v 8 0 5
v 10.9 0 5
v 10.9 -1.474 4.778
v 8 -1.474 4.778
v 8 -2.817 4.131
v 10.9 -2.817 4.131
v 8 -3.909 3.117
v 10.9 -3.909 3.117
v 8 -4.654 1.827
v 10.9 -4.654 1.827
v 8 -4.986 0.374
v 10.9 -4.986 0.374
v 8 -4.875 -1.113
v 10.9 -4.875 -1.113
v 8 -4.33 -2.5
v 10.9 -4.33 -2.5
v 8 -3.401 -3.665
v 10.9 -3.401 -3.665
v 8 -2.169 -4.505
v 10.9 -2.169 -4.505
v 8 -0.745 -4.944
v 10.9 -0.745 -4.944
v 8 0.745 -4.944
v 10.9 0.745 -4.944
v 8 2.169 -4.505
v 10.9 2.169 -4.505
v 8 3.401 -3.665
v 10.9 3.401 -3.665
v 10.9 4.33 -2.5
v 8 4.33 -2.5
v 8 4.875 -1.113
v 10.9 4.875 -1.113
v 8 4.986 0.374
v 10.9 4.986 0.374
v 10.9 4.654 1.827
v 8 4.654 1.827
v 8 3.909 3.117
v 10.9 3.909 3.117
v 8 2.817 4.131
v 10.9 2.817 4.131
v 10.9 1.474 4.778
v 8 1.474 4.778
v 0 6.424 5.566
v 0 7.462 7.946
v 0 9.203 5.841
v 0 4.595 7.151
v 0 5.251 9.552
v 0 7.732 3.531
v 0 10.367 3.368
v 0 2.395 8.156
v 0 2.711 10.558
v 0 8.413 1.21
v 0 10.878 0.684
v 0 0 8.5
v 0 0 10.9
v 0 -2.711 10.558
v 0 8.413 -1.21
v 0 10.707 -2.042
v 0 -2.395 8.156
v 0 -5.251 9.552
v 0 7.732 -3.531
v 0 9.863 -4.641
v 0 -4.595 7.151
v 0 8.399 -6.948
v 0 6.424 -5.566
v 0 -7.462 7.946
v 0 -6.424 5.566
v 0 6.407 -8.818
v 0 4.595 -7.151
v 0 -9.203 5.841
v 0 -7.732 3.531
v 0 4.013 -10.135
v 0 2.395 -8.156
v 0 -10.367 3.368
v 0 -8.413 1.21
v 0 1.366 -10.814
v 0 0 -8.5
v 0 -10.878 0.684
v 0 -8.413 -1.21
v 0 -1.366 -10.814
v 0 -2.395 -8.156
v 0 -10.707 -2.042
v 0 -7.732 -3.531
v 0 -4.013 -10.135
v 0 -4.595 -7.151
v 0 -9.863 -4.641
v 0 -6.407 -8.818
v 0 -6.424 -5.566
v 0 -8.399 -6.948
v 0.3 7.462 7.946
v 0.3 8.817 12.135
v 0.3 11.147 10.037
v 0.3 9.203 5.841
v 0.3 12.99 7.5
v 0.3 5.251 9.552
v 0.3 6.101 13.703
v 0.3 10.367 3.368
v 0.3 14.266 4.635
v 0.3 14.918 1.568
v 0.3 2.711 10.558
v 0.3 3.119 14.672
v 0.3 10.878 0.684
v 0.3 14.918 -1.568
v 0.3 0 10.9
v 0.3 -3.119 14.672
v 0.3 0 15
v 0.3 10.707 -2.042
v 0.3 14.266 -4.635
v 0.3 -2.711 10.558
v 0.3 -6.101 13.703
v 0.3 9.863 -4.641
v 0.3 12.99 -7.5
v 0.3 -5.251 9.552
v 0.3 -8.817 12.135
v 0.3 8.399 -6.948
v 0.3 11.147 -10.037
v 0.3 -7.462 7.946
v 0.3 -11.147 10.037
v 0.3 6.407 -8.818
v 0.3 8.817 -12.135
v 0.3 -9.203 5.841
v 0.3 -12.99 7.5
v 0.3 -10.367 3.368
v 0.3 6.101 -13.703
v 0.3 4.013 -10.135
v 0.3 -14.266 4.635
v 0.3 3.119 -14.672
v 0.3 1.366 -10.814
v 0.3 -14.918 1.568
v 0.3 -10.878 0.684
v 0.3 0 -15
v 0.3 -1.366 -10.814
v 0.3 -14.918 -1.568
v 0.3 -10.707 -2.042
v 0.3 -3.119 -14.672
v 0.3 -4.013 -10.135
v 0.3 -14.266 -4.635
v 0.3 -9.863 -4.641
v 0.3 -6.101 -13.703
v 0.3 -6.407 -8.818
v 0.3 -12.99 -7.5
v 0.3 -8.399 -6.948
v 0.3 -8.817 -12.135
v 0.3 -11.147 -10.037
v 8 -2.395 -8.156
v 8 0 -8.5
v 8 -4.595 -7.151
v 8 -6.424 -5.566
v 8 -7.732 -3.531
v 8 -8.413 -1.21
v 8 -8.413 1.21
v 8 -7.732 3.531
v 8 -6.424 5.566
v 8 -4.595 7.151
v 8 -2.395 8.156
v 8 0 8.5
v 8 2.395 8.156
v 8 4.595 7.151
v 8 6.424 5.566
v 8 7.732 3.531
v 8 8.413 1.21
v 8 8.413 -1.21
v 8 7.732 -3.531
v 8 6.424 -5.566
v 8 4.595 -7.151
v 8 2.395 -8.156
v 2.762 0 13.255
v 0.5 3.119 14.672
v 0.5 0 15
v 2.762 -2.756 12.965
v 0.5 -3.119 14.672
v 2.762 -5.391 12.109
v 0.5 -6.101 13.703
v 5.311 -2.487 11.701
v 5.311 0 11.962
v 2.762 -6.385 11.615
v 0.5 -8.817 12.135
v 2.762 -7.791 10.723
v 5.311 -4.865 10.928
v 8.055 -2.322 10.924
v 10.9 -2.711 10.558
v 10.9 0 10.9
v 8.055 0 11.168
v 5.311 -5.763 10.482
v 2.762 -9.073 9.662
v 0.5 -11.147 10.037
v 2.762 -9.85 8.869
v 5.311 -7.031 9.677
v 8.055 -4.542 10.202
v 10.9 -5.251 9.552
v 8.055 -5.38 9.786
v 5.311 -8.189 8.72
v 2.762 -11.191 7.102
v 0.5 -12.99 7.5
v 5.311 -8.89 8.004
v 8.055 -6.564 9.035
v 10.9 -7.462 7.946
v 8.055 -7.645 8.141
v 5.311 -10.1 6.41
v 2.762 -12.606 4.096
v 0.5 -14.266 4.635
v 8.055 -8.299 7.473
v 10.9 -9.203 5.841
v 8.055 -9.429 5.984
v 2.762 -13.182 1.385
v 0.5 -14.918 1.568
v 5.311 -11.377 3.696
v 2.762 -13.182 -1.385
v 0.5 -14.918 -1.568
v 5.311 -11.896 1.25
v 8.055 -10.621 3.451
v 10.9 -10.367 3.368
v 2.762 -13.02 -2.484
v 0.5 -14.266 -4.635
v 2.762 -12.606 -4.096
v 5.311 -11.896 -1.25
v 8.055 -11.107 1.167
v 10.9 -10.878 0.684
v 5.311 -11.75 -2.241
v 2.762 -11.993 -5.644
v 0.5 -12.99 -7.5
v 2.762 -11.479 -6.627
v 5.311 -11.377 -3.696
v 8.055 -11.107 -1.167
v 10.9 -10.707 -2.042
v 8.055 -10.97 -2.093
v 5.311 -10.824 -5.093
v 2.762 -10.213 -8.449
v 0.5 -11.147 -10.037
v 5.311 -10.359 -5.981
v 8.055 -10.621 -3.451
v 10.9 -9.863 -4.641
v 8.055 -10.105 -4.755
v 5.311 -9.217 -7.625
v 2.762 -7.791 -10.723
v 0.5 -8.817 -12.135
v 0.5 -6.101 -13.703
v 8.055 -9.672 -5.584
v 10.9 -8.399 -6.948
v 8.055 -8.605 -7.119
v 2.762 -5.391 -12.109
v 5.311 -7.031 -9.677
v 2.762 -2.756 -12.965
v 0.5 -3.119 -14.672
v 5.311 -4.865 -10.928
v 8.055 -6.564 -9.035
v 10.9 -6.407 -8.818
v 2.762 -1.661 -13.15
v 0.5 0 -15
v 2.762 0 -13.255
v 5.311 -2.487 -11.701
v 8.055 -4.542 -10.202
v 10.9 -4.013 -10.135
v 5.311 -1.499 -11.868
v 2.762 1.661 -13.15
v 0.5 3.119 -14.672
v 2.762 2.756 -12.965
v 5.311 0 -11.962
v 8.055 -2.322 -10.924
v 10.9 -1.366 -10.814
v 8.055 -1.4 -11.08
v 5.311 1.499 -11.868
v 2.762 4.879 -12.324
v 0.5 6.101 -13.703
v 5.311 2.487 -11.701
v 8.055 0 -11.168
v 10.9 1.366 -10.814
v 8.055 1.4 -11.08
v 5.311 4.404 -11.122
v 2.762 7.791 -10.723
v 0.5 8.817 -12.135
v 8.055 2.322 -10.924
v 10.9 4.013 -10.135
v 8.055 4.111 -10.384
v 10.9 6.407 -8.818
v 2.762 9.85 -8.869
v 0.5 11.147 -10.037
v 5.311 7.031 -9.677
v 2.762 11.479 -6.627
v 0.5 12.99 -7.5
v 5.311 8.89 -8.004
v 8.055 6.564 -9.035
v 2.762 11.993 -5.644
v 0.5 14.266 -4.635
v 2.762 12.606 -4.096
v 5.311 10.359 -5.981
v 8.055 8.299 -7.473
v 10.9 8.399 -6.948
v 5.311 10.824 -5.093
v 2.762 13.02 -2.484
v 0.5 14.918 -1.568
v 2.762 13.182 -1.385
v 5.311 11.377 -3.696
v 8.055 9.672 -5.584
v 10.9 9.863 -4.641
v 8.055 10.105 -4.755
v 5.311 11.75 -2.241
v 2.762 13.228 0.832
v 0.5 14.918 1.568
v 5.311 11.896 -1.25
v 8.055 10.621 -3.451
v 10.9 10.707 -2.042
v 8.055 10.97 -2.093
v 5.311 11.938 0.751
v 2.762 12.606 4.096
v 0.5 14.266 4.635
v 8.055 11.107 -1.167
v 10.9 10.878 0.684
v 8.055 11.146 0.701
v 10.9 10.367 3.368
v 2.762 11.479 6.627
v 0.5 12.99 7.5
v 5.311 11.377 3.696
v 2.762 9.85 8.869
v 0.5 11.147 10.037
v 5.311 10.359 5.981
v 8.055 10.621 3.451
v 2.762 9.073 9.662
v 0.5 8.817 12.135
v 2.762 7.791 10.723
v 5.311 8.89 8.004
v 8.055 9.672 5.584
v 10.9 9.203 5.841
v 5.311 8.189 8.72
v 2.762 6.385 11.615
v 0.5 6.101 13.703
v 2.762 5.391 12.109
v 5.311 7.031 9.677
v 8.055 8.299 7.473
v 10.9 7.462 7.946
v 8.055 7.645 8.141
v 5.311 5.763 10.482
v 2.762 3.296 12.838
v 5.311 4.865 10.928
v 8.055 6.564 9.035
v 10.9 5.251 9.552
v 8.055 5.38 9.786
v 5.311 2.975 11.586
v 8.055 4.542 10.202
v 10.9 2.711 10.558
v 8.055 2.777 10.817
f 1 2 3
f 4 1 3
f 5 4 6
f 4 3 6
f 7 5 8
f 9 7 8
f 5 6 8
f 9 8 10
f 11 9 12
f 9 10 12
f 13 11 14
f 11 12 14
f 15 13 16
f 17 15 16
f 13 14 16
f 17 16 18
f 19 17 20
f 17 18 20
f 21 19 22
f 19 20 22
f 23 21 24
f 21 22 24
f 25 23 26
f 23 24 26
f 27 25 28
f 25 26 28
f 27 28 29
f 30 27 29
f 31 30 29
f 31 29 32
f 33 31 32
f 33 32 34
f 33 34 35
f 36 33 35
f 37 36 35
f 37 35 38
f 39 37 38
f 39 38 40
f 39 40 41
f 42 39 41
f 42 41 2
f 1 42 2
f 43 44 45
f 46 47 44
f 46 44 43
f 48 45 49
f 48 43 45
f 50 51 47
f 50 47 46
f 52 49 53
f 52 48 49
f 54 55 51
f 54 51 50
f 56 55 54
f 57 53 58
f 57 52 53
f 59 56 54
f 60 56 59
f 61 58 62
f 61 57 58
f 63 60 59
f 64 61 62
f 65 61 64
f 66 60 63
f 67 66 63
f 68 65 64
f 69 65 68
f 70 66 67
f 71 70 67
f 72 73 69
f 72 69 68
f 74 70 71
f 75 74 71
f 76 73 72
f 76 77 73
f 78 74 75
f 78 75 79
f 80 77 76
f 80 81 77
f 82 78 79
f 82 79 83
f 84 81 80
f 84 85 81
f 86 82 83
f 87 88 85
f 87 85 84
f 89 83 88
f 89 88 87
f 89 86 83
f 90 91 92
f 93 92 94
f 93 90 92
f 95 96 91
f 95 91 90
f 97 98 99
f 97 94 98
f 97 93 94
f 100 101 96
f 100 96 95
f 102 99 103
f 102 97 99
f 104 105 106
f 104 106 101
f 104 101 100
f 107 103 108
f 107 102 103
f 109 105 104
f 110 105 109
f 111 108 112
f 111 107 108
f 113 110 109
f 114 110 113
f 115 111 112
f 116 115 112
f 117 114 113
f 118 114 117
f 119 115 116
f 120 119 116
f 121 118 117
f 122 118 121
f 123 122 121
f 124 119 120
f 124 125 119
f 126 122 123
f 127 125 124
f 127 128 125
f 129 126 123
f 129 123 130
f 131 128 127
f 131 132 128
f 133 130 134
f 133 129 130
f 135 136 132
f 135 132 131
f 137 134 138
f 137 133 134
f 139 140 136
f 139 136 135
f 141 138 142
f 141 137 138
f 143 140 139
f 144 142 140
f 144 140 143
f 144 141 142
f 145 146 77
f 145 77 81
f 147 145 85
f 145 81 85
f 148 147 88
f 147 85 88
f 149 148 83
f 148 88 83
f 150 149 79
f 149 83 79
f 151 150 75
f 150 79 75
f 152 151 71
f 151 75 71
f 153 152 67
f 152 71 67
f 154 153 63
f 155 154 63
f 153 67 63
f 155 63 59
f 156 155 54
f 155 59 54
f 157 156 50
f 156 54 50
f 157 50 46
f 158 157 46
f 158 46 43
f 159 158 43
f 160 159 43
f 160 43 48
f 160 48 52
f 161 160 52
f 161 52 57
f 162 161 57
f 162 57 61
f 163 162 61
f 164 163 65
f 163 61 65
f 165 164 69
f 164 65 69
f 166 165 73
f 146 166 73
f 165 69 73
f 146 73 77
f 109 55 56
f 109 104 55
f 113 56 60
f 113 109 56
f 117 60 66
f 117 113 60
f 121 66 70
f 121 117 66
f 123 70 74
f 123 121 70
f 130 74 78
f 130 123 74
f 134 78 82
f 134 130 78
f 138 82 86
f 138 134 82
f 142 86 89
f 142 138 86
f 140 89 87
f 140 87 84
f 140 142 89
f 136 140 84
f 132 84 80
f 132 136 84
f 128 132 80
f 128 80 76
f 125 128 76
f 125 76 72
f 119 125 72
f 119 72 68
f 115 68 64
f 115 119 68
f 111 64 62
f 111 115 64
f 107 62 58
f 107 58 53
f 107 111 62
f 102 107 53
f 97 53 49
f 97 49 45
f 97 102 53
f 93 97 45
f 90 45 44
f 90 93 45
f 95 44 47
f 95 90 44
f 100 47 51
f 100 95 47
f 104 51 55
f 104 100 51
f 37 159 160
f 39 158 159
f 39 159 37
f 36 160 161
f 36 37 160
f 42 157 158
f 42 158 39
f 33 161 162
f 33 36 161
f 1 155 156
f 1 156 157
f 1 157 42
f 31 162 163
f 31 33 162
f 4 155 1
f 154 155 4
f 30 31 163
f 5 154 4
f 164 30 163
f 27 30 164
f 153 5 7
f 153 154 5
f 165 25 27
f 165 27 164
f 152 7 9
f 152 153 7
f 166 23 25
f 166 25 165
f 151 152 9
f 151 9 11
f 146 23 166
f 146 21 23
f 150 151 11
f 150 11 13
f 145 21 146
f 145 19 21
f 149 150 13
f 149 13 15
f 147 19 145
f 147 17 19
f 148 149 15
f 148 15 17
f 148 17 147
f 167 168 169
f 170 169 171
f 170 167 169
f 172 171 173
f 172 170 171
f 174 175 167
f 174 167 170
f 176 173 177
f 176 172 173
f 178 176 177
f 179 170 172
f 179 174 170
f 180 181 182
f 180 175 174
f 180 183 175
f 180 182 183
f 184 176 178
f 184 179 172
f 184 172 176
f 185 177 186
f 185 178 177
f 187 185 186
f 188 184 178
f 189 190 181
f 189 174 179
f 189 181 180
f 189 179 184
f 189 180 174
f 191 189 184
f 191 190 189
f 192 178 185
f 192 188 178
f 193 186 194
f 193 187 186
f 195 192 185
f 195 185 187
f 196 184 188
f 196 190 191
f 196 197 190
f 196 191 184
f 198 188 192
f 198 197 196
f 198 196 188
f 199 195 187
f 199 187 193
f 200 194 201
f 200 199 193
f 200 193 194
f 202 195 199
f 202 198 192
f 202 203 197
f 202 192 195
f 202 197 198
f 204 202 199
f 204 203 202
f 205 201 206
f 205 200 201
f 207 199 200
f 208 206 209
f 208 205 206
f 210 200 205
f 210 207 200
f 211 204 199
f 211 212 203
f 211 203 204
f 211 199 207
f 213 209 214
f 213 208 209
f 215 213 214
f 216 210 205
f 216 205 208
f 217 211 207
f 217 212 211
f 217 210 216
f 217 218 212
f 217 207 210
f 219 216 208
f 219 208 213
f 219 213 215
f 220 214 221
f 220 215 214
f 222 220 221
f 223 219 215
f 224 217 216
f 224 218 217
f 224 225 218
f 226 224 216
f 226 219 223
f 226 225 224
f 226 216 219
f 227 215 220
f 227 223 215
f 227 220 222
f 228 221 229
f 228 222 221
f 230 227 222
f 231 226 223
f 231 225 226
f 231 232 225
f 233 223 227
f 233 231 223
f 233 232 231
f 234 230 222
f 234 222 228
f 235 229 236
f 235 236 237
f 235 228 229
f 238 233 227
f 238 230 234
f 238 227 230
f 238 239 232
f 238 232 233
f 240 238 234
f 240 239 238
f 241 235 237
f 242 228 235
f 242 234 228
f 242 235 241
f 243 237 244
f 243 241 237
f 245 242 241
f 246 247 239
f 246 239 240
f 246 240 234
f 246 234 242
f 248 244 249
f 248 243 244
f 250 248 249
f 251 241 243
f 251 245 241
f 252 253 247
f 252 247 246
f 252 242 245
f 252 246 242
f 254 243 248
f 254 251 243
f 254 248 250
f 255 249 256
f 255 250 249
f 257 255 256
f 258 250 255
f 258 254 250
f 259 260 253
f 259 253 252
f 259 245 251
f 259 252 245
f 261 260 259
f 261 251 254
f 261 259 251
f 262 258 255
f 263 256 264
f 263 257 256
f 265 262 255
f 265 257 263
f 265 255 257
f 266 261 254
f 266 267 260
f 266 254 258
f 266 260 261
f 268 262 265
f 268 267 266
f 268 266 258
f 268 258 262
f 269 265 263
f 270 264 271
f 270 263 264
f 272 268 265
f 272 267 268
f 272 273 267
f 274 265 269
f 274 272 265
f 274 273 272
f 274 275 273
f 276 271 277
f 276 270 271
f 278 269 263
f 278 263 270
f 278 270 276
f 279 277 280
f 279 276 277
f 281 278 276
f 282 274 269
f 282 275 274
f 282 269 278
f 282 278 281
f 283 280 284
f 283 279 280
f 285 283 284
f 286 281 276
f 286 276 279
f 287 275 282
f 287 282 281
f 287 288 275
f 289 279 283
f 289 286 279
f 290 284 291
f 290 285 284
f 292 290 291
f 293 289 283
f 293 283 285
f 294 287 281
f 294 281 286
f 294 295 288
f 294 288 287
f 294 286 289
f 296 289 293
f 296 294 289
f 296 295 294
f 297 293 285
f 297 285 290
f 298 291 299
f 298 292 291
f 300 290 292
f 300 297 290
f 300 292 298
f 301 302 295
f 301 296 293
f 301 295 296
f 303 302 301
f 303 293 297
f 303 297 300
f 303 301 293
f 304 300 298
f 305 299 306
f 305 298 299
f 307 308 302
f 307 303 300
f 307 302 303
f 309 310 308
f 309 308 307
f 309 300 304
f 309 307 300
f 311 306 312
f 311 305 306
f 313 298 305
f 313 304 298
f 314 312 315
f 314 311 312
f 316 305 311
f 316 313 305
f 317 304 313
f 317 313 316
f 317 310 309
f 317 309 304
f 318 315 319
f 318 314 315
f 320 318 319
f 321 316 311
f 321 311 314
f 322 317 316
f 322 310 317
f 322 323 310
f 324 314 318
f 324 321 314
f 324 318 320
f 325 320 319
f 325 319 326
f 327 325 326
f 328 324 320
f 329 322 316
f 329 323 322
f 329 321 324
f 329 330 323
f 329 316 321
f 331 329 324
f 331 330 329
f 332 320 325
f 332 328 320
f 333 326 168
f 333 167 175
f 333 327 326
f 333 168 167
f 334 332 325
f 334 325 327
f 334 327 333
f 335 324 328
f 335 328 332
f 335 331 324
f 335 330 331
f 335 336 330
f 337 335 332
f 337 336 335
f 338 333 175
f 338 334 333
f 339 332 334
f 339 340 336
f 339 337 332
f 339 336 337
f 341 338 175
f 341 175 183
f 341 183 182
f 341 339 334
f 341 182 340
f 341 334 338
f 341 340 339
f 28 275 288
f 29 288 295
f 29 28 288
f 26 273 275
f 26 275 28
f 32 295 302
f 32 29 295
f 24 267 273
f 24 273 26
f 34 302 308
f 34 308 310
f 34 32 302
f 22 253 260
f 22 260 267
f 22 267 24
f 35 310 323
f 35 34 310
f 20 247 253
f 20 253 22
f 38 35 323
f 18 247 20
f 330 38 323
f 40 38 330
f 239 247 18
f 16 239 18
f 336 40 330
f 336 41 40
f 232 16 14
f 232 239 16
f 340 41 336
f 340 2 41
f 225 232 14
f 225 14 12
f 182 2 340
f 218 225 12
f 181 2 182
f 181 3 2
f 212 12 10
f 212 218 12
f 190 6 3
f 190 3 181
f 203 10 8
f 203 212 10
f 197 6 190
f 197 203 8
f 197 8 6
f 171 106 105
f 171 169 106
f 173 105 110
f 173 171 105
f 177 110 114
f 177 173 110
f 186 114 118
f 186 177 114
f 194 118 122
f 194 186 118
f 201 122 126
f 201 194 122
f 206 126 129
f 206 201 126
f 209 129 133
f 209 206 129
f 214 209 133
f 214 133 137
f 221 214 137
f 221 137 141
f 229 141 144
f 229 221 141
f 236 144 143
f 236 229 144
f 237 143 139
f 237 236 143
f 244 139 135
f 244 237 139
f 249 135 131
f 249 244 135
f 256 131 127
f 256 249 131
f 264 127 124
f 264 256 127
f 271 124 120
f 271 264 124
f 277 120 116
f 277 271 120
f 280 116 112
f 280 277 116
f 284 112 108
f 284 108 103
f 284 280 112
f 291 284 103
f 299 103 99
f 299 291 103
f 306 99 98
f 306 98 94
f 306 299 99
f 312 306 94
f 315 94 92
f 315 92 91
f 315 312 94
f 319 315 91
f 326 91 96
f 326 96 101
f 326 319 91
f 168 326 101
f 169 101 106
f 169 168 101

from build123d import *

# Parameters (mm, degrees)
SKETCH010_R     = 8.5
POCKET005_DEPTH = 8
SKETCH011_R     = 5
POCKET006_DEPTH = 10.901


with BuildPart() as part:
    # Sketch009 → Revolution002 (revolve)
    with BuildSketch(Plane.XZ):
        with BuildLine():
            Line((0, 0), (0, 10.9))
            Line((0, 10.9), (0.3, 10.9))
            Line((0.3, 10.9), (0.3, 15))
            Line((0.3, 15), (0.5, 15))
            ThreePointArc((0.5, 15), (5.310502, 11.962006), (10.9, 10.9))
            Line((10.9, 10.9), (10.9, 0))
            Line((10.9, 0), (0, 0))
        make_face()
    revolve(axis=Axis((0, 0, 0), (1, 0, 0)))

    # Sketch010 (on Face1 of Revolution002) → Pocket005 (cut)
    with BuildSketch(Plane(origin=(0, 0, 0), x_dir=(0, 0, -1), z_dir=(-1, 0, 0))):
        Circle(SKETCH010_R)
    extrude(amount=-POCKET005_DEPTH, mode=Mode.SUBTRACT)

    # Sketch011 (on Face8 of Pocket005) → Pocket006 (cut, through all)
    with BuildSketch(Plane(origin=(10.9, 0, 0), x_dir=(0, 0, 1), z_dir=(1, 0, 0))):
        Circle(SKETCH011_R)
    extrude(amount=-POCKET006_DEPTH, mode=Mode.SUBTRACT)


solid = part.part
